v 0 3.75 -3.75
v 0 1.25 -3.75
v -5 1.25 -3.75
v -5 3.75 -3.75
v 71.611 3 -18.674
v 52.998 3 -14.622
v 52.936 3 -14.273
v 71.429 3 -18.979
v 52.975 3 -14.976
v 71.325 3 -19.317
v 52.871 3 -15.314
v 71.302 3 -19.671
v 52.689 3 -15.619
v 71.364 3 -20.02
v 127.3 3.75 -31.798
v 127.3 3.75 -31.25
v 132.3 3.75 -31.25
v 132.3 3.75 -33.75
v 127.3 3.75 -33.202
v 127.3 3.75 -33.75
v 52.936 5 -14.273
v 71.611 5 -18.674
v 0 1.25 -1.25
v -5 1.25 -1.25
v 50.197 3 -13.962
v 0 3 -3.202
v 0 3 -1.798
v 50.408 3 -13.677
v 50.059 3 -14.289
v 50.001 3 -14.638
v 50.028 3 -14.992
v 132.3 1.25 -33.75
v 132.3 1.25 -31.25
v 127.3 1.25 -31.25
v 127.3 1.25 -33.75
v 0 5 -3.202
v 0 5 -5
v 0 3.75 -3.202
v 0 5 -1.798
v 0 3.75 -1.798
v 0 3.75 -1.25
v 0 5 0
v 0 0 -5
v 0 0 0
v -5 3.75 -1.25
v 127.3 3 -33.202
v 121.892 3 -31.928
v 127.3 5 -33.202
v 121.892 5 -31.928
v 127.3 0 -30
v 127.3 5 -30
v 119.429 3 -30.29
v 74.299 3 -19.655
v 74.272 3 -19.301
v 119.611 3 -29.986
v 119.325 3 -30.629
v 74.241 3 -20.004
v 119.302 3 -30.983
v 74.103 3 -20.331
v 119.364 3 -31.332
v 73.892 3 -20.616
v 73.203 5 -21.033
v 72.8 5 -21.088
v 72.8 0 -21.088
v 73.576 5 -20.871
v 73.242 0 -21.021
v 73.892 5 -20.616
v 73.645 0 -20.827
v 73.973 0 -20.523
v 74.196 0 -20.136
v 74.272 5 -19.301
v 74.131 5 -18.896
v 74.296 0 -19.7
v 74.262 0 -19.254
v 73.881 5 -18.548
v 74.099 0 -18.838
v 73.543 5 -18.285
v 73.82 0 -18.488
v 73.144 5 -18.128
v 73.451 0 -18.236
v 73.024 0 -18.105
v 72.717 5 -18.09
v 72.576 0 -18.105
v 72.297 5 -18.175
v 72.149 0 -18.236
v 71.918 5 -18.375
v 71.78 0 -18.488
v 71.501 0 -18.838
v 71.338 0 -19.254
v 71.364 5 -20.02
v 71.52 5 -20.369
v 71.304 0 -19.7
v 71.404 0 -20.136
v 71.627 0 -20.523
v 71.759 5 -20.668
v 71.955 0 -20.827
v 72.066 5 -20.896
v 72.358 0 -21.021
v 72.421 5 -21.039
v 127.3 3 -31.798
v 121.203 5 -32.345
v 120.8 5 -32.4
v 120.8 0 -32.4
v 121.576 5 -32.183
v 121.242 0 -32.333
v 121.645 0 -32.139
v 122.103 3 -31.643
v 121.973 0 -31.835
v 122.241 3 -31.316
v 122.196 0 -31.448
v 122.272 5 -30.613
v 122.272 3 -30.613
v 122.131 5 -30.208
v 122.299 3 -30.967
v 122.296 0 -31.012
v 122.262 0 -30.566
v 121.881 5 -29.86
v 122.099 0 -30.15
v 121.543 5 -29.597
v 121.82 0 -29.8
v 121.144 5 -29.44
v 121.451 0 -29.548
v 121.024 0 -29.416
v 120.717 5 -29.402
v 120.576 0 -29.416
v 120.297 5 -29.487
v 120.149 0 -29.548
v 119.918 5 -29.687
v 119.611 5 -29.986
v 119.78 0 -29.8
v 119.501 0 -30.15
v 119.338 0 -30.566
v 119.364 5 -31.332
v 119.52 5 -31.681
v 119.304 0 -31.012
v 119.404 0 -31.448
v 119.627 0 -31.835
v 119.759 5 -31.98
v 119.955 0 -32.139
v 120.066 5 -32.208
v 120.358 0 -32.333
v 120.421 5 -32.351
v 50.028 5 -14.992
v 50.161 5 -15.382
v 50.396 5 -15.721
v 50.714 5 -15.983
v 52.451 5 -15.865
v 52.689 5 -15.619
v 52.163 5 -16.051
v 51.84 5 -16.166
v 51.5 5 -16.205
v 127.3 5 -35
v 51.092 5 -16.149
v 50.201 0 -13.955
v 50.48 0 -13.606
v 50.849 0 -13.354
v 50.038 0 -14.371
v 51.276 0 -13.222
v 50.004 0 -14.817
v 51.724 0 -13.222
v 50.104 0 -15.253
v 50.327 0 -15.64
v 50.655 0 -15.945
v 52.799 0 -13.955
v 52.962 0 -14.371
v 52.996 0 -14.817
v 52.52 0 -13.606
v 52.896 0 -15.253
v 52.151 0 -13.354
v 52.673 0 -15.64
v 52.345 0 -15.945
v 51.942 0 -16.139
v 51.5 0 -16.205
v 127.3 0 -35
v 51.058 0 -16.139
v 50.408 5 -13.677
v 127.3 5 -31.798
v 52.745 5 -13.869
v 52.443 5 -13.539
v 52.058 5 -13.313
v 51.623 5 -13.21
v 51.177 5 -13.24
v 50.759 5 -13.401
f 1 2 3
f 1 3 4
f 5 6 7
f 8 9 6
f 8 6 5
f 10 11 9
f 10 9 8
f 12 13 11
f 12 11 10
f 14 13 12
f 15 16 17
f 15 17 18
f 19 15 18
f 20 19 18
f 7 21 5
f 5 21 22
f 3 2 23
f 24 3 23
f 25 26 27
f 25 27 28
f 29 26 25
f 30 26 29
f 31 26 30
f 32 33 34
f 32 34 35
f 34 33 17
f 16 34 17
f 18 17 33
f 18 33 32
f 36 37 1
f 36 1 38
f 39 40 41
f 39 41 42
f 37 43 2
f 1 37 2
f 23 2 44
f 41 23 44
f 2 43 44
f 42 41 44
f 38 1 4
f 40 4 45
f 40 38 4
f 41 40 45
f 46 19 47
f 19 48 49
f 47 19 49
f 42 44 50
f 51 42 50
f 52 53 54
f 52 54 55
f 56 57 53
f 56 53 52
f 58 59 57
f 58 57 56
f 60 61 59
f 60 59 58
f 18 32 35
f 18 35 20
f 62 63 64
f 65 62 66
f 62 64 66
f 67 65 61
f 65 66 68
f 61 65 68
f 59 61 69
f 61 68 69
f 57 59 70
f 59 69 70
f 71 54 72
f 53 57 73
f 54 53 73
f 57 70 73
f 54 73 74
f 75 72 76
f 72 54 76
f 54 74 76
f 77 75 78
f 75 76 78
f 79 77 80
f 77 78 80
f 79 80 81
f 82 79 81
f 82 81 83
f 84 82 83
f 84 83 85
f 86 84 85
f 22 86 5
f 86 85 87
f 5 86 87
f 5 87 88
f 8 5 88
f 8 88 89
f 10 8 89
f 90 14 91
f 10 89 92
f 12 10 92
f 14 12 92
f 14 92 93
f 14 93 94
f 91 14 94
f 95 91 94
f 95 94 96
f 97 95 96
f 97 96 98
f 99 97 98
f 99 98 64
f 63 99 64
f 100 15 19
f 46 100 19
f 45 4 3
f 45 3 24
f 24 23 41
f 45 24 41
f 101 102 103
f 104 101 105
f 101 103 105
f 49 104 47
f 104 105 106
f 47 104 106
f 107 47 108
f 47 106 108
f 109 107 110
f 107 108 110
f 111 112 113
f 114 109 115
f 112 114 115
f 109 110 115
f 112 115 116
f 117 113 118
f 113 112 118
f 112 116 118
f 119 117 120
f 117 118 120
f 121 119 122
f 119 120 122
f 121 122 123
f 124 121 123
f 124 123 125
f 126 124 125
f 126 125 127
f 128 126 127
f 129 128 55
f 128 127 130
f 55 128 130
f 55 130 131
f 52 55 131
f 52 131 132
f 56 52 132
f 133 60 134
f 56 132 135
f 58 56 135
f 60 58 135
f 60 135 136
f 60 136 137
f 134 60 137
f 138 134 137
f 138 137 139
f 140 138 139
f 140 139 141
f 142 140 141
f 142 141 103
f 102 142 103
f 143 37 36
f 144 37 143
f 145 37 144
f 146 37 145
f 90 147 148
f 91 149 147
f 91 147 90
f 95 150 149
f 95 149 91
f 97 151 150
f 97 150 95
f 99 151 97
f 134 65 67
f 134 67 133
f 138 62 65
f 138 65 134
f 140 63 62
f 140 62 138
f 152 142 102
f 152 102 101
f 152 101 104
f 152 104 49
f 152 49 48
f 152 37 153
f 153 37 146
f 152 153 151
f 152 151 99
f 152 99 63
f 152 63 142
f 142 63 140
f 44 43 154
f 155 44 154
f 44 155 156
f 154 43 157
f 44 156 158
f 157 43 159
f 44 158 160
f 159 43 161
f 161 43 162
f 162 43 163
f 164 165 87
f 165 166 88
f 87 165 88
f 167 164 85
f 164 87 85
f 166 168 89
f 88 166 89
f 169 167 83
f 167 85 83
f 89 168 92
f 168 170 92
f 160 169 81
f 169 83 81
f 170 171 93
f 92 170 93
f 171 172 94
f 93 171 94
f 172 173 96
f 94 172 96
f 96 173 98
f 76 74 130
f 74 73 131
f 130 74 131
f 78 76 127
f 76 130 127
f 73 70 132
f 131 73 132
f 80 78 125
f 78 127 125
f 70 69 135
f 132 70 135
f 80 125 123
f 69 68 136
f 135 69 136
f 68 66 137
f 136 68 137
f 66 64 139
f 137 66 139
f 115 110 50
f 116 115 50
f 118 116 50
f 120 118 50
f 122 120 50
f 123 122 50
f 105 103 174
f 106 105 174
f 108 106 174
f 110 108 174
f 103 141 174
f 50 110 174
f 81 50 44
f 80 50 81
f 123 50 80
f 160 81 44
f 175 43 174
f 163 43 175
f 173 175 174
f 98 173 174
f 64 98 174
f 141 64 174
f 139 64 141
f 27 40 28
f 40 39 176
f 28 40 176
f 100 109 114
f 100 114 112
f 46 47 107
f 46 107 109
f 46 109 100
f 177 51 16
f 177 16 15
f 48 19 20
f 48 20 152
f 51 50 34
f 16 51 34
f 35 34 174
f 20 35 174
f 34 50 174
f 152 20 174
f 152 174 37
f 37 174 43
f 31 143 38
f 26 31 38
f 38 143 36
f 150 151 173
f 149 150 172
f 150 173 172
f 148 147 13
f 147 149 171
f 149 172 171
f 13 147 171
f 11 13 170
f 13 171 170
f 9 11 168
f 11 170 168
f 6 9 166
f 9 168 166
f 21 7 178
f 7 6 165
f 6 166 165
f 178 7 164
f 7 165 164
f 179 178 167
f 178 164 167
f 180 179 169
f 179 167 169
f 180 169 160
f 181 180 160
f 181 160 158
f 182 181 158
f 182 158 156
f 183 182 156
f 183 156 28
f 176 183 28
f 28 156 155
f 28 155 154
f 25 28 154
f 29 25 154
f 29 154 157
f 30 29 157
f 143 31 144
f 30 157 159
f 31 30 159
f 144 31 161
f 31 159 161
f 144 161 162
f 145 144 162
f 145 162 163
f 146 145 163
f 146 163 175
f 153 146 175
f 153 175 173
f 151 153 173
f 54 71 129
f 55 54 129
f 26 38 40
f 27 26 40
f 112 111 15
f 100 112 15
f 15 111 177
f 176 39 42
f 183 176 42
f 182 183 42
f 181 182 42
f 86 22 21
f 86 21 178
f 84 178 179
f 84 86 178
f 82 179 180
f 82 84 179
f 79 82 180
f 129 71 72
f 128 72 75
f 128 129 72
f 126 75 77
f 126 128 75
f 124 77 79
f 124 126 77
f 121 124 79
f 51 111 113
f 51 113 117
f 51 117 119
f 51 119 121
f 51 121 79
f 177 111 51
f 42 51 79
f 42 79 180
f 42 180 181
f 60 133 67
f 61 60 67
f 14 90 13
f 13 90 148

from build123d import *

# Parameters (mm, degrees)
BOSS_EXTRUDE1_DEPTH = 5
SKETCH2_W           = 2.5
SKETCH2_H           = 2.5
BOSS_EXTRUDE2_DEPTH = 5
SKETCH3_W           = 2.5
SKETCH3_H           = 2.5
BOSS_EXTRUDE3_DEPTH = 5
SKETCH6_R           = 1.5
CUT_EXTRUDE1_DEPTH  = 5
CUT_EXTRUDE3_DEPTH  = 2


with BuildPart() as part:
    # Sketch1 → Boss-Extrude1 (new body)
    with BuildSketch(Plane(origin=(0, 0, 0), x_dir=(1, 0, 0), z_dir=(0, 1, 0))):
        Polygon((0, 5), (0, 0), (127.3, 30), (127.3, 35), align=None)
    extrude(amount=BOSS_EXTRUDE1_DEPTH)

    # Sketch2 → Boss-Extrude2 (add)
    with BuildSketch(Plane(origin=(127.3, 0, 0), x_dir=(0, 0, -1), z_dir=(1, 0, 0))):
        with Locations((32.5, 2.5)):
            Rectangle(SKETCH2_W, SKETCH2_H)
    extrude(amount=BOSS_EXTRUDE2_DEPTH)

    # Sketch3 → Boss-Extrude3 (add)
    with BuildSketch(Plane.ZY):
        with Locations((-2.5, 2.5)):
            Rectangle(SKETCH3_W, SKETCH3_H)
    extrude(amount=BOSS_EXTRUDE3_DEPTH)

    # Sketch6 → Cut-Extrude1 (cut)
    with BuildSketch(Plane.XZ):
        with Locations(Location((51.5, -14.705168766, 0), (0, 0, 270))):
            Circle(SKETCH6_R)
        with Locations(Location((72.8, -19.587839875, 0), (0, 0, 270))):
            Circle(SKETCH6_R)
        with Locations(Location((120.8, -30.899701619, 0), (0, 0, 270))):
            Circle(SKETCH6_R)
    extrude(amount=-CUT_EXTRUDE1_DEPTH, mode=Mode.SUBTRACT)

    # Sketch10 → Cut-Extrude3 (cut)
    with BuildSketch(Plane(origin=(0, 5, 0), x_dir=(1, 0, 0), z_dir=(0, 1, 0))):
        Polygon((0, 3.202061361), (0, 1.797938639), (127.3, 31.797938639), (127.3, 33.202061361), align=None)
    extrude(amount=-CUT_EXTRUDE3_DEPTH, mode=Mode.SUBTRACT)


solid = part.part
